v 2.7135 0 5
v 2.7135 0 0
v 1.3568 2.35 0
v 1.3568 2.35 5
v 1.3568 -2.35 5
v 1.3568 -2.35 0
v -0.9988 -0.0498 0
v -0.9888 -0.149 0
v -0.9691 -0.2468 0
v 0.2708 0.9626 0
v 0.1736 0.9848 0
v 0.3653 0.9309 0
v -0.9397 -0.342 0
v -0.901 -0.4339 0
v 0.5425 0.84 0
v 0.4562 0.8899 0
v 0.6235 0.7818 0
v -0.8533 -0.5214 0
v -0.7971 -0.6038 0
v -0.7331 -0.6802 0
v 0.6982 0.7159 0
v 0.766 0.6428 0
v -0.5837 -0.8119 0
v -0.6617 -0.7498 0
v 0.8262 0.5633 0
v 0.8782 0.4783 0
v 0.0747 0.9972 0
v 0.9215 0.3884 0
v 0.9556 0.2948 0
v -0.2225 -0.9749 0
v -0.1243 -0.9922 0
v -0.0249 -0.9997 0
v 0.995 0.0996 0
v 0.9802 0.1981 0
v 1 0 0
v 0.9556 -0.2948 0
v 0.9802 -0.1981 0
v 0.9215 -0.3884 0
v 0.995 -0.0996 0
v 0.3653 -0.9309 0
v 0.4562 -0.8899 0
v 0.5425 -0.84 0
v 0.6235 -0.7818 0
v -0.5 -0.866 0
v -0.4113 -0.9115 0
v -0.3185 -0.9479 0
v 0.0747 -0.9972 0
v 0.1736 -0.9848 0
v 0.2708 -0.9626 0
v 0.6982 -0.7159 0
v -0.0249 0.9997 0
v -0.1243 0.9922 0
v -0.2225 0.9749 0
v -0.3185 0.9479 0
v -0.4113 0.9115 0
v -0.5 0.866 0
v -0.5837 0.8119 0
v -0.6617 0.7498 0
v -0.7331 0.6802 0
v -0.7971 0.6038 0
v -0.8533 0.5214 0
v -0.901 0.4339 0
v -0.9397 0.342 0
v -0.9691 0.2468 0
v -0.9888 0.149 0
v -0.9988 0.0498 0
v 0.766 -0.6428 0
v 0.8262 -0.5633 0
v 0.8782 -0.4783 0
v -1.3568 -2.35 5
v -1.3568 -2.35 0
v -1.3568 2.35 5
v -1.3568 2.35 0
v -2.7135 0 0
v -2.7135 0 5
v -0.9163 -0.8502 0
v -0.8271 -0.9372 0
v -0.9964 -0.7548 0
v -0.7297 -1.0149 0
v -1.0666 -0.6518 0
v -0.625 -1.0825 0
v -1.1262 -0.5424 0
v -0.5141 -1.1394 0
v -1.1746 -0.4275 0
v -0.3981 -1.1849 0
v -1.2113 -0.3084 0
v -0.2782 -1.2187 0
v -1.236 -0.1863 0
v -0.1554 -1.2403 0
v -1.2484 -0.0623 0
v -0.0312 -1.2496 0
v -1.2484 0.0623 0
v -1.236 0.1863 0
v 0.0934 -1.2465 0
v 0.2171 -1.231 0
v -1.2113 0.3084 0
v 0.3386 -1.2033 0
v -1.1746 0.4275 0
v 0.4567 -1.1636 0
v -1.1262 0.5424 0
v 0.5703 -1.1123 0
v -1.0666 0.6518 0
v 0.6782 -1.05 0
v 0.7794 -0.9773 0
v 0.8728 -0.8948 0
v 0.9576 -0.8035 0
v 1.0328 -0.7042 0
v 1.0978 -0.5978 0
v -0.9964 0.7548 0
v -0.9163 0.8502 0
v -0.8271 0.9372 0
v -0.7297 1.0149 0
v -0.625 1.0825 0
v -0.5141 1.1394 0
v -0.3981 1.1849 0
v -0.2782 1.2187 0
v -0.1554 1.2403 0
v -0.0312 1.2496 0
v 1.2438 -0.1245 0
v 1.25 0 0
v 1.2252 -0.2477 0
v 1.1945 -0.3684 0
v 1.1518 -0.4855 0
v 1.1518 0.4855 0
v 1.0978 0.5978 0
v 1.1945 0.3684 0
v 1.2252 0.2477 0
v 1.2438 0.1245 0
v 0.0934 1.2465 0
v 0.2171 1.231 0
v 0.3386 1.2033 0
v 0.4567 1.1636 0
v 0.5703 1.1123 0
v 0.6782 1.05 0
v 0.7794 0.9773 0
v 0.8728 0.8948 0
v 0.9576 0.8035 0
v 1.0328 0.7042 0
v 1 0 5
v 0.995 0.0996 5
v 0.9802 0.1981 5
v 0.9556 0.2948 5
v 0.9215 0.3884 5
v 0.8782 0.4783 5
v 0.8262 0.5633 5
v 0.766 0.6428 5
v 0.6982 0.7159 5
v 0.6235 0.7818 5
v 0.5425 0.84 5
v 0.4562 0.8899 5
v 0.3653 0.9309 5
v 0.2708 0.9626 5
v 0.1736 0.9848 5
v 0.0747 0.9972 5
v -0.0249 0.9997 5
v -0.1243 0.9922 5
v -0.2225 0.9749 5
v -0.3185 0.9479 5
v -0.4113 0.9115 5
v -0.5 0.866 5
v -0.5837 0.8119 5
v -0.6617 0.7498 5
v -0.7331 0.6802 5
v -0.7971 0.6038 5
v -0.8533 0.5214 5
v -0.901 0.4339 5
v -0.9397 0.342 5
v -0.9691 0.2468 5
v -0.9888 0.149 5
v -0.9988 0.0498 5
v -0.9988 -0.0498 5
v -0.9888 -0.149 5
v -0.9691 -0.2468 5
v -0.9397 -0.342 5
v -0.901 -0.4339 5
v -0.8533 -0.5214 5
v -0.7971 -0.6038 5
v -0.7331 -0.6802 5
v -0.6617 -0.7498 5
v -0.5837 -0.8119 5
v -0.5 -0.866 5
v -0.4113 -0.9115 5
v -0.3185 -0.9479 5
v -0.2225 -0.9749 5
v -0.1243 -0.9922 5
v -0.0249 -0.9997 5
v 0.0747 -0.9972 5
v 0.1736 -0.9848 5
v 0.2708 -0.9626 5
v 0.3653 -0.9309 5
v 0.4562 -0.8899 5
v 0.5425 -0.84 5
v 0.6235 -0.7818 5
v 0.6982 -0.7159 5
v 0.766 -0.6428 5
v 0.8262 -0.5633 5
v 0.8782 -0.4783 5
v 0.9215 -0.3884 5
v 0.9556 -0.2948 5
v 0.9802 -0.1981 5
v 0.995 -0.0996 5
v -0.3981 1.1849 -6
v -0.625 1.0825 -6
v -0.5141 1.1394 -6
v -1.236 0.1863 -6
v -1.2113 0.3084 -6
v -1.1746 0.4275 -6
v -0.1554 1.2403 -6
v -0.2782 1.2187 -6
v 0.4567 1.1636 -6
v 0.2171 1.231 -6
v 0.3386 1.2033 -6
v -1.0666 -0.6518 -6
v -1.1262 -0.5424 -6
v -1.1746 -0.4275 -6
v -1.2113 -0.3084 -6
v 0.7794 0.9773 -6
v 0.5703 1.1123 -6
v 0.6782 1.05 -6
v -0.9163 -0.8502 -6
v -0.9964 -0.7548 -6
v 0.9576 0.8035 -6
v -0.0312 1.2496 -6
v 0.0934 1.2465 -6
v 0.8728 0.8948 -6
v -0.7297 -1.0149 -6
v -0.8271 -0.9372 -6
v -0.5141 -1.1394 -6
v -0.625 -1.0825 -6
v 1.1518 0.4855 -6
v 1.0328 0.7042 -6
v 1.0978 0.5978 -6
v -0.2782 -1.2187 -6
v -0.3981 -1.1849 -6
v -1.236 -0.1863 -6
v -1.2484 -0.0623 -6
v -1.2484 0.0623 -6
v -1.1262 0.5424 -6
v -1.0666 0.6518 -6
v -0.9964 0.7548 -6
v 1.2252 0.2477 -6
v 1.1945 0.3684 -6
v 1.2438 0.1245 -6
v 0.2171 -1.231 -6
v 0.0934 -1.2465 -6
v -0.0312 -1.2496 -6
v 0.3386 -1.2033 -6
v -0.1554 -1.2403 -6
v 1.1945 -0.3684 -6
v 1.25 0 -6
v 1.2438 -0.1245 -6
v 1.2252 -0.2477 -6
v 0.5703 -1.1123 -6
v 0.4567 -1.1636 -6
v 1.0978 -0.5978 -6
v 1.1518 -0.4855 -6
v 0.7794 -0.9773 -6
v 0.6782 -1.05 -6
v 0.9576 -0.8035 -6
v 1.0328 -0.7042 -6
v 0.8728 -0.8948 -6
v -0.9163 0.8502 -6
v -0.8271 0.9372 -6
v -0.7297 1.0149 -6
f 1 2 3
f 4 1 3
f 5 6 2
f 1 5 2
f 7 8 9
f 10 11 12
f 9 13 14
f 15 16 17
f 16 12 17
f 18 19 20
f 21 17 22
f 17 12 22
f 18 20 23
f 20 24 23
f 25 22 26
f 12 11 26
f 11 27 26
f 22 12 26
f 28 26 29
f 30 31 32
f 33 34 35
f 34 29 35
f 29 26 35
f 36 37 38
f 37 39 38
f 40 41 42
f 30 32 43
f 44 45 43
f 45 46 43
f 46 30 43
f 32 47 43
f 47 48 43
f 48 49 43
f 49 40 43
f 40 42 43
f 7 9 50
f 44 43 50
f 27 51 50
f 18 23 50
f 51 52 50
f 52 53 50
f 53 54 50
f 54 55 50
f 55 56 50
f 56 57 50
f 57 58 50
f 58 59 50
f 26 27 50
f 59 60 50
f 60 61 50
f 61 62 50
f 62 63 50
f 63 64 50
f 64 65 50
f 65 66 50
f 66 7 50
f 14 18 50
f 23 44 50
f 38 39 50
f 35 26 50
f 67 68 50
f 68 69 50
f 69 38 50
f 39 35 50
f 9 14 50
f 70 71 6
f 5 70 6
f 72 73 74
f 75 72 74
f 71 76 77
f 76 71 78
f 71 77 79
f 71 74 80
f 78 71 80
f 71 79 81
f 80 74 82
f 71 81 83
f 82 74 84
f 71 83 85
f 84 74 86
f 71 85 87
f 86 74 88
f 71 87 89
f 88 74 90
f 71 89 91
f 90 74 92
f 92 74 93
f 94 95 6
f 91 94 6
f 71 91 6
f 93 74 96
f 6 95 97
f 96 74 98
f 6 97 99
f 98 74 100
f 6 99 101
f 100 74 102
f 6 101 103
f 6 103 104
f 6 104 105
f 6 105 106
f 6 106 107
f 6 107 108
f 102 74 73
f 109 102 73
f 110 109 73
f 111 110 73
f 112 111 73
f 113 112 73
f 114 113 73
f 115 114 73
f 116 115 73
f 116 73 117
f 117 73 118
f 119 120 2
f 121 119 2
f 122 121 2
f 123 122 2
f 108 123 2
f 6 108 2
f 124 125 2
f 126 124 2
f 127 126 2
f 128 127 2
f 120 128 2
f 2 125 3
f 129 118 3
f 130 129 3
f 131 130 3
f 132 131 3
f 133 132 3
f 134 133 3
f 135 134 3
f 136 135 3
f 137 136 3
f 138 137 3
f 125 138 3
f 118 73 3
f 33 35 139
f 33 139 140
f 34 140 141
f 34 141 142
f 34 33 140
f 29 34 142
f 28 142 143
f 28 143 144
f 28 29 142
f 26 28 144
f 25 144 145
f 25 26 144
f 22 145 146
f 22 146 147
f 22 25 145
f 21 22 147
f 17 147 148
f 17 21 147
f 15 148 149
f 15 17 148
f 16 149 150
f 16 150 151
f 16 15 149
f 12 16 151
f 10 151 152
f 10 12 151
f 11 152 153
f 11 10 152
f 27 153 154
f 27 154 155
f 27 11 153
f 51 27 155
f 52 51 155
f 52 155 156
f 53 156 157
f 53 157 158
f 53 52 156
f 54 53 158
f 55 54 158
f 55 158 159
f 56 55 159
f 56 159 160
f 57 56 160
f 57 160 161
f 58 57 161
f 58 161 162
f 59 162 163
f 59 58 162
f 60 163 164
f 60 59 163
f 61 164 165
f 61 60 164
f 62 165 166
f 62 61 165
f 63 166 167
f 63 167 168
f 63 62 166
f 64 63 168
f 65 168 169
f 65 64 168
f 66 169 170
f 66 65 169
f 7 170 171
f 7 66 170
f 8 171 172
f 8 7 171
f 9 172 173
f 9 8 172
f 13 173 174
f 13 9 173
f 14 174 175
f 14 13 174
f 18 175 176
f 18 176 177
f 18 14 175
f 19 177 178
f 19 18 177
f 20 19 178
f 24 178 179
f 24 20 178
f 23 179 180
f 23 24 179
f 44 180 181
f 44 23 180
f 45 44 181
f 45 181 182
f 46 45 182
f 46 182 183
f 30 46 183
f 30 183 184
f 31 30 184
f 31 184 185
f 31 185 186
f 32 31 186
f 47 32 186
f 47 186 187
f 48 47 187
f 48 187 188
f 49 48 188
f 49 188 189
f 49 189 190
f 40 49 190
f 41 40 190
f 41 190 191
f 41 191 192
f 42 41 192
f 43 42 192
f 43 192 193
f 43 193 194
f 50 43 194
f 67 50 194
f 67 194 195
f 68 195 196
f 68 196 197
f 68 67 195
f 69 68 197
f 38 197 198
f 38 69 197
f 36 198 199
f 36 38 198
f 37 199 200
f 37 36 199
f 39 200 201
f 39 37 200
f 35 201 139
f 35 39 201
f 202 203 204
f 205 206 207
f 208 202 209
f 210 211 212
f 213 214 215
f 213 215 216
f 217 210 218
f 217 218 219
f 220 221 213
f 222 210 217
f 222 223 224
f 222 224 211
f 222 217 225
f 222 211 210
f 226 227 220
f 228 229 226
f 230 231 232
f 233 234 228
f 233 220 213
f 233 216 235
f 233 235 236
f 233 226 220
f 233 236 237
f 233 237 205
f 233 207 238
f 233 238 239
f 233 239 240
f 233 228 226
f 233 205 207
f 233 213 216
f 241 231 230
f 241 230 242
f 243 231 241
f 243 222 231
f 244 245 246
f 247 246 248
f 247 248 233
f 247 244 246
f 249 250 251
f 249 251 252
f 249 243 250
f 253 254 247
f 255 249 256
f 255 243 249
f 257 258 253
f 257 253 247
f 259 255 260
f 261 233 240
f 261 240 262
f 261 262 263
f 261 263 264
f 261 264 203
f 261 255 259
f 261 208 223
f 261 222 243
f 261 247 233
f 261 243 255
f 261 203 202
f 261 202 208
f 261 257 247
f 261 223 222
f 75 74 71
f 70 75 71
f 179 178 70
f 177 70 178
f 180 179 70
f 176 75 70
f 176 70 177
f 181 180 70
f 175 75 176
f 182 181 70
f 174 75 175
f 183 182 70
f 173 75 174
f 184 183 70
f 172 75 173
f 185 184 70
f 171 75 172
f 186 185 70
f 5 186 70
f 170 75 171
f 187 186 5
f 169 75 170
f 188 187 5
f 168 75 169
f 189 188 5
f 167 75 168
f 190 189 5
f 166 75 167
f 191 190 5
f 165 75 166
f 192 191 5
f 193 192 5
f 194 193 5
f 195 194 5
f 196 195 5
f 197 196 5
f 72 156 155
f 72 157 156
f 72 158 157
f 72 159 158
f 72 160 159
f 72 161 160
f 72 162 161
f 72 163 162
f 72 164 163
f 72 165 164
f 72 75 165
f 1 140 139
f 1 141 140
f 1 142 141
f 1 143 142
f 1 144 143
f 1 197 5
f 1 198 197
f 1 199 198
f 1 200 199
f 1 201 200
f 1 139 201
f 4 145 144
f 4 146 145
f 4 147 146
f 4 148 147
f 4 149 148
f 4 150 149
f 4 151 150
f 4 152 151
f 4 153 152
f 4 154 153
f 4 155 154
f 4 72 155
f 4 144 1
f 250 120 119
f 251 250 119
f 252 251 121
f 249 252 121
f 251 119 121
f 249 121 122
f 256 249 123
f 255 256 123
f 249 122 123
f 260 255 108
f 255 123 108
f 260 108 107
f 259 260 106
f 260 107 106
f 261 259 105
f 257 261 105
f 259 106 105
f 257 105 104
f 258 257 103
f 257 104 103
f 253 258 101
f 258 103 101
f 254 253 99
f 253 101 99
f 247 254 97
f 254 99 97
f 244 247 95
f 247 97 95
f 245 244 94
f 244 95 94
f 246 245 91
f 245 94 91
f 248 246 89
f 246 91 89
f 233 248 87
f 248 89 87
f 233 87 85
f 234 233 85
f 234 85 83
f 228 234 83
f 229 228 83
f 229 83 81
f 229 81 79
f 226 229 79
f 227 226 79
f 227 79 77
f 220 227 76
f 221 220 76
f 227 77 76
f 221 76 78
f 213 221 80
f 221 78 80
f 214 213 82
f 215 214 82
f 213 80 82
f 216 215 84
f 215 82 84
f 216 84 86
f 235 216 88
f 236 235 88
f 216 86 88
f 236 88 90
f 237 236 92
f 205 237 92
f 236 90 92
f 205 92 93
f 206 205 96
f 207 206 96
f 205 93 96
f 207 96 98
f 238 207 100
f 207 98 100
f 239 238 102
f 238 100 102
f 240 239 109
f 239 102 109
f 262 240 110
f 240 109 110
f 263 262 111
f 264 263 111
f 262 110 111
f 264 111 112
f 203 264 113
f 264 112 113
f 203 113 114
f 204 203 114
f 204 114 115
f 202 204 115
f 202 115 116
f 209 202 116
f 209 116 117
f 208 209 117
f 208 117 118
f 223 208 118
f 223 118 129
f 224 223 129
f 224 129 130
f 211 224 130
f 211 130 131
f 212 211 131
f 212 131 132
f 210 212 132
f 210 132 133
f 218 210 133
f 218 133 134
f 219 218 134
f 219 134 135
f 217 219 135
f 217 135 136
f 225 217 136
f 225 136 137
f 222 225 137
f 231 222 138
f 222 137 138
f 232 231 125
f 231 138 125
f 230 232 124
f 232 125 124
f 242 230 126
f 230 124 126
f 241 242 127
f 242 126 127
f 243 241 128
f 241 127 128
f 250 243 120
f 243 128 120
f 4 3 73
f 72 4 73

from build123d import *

# Parameters (mm, degrees)
SKETCH_R     = 1
PAD_DEPTH    = 5
SKETCH001_R  = 1.25
PAD001_DEPTH = 6


with BuildPart() as part:
    # Sketch → Pad (new body)
    with BuildSketch(Plane.XY):
        Polygon((1.356773, -2.35), (2.713546, 0), (1.356773, 2.35), (-1.356773, 2.35), (-2.713546, 0), (-1.356773, -2.35), align=None)
        Circle(SKETCH_R, mode=Mode.SUBTRACT)
    extrude(amount=PAD_DEPTH)

    # Sketch001 (on Face8 of Pad) → Pad001 (join)
    with BuildSketch(Plane(origin=(0, 0, 0), x_dir=(1, 0, 0), z_dir=(0, 0, -1))):
        Circle(SKETCH001_R)
    extrude(amount=PAD001_DEPTH)


solid = part.part
